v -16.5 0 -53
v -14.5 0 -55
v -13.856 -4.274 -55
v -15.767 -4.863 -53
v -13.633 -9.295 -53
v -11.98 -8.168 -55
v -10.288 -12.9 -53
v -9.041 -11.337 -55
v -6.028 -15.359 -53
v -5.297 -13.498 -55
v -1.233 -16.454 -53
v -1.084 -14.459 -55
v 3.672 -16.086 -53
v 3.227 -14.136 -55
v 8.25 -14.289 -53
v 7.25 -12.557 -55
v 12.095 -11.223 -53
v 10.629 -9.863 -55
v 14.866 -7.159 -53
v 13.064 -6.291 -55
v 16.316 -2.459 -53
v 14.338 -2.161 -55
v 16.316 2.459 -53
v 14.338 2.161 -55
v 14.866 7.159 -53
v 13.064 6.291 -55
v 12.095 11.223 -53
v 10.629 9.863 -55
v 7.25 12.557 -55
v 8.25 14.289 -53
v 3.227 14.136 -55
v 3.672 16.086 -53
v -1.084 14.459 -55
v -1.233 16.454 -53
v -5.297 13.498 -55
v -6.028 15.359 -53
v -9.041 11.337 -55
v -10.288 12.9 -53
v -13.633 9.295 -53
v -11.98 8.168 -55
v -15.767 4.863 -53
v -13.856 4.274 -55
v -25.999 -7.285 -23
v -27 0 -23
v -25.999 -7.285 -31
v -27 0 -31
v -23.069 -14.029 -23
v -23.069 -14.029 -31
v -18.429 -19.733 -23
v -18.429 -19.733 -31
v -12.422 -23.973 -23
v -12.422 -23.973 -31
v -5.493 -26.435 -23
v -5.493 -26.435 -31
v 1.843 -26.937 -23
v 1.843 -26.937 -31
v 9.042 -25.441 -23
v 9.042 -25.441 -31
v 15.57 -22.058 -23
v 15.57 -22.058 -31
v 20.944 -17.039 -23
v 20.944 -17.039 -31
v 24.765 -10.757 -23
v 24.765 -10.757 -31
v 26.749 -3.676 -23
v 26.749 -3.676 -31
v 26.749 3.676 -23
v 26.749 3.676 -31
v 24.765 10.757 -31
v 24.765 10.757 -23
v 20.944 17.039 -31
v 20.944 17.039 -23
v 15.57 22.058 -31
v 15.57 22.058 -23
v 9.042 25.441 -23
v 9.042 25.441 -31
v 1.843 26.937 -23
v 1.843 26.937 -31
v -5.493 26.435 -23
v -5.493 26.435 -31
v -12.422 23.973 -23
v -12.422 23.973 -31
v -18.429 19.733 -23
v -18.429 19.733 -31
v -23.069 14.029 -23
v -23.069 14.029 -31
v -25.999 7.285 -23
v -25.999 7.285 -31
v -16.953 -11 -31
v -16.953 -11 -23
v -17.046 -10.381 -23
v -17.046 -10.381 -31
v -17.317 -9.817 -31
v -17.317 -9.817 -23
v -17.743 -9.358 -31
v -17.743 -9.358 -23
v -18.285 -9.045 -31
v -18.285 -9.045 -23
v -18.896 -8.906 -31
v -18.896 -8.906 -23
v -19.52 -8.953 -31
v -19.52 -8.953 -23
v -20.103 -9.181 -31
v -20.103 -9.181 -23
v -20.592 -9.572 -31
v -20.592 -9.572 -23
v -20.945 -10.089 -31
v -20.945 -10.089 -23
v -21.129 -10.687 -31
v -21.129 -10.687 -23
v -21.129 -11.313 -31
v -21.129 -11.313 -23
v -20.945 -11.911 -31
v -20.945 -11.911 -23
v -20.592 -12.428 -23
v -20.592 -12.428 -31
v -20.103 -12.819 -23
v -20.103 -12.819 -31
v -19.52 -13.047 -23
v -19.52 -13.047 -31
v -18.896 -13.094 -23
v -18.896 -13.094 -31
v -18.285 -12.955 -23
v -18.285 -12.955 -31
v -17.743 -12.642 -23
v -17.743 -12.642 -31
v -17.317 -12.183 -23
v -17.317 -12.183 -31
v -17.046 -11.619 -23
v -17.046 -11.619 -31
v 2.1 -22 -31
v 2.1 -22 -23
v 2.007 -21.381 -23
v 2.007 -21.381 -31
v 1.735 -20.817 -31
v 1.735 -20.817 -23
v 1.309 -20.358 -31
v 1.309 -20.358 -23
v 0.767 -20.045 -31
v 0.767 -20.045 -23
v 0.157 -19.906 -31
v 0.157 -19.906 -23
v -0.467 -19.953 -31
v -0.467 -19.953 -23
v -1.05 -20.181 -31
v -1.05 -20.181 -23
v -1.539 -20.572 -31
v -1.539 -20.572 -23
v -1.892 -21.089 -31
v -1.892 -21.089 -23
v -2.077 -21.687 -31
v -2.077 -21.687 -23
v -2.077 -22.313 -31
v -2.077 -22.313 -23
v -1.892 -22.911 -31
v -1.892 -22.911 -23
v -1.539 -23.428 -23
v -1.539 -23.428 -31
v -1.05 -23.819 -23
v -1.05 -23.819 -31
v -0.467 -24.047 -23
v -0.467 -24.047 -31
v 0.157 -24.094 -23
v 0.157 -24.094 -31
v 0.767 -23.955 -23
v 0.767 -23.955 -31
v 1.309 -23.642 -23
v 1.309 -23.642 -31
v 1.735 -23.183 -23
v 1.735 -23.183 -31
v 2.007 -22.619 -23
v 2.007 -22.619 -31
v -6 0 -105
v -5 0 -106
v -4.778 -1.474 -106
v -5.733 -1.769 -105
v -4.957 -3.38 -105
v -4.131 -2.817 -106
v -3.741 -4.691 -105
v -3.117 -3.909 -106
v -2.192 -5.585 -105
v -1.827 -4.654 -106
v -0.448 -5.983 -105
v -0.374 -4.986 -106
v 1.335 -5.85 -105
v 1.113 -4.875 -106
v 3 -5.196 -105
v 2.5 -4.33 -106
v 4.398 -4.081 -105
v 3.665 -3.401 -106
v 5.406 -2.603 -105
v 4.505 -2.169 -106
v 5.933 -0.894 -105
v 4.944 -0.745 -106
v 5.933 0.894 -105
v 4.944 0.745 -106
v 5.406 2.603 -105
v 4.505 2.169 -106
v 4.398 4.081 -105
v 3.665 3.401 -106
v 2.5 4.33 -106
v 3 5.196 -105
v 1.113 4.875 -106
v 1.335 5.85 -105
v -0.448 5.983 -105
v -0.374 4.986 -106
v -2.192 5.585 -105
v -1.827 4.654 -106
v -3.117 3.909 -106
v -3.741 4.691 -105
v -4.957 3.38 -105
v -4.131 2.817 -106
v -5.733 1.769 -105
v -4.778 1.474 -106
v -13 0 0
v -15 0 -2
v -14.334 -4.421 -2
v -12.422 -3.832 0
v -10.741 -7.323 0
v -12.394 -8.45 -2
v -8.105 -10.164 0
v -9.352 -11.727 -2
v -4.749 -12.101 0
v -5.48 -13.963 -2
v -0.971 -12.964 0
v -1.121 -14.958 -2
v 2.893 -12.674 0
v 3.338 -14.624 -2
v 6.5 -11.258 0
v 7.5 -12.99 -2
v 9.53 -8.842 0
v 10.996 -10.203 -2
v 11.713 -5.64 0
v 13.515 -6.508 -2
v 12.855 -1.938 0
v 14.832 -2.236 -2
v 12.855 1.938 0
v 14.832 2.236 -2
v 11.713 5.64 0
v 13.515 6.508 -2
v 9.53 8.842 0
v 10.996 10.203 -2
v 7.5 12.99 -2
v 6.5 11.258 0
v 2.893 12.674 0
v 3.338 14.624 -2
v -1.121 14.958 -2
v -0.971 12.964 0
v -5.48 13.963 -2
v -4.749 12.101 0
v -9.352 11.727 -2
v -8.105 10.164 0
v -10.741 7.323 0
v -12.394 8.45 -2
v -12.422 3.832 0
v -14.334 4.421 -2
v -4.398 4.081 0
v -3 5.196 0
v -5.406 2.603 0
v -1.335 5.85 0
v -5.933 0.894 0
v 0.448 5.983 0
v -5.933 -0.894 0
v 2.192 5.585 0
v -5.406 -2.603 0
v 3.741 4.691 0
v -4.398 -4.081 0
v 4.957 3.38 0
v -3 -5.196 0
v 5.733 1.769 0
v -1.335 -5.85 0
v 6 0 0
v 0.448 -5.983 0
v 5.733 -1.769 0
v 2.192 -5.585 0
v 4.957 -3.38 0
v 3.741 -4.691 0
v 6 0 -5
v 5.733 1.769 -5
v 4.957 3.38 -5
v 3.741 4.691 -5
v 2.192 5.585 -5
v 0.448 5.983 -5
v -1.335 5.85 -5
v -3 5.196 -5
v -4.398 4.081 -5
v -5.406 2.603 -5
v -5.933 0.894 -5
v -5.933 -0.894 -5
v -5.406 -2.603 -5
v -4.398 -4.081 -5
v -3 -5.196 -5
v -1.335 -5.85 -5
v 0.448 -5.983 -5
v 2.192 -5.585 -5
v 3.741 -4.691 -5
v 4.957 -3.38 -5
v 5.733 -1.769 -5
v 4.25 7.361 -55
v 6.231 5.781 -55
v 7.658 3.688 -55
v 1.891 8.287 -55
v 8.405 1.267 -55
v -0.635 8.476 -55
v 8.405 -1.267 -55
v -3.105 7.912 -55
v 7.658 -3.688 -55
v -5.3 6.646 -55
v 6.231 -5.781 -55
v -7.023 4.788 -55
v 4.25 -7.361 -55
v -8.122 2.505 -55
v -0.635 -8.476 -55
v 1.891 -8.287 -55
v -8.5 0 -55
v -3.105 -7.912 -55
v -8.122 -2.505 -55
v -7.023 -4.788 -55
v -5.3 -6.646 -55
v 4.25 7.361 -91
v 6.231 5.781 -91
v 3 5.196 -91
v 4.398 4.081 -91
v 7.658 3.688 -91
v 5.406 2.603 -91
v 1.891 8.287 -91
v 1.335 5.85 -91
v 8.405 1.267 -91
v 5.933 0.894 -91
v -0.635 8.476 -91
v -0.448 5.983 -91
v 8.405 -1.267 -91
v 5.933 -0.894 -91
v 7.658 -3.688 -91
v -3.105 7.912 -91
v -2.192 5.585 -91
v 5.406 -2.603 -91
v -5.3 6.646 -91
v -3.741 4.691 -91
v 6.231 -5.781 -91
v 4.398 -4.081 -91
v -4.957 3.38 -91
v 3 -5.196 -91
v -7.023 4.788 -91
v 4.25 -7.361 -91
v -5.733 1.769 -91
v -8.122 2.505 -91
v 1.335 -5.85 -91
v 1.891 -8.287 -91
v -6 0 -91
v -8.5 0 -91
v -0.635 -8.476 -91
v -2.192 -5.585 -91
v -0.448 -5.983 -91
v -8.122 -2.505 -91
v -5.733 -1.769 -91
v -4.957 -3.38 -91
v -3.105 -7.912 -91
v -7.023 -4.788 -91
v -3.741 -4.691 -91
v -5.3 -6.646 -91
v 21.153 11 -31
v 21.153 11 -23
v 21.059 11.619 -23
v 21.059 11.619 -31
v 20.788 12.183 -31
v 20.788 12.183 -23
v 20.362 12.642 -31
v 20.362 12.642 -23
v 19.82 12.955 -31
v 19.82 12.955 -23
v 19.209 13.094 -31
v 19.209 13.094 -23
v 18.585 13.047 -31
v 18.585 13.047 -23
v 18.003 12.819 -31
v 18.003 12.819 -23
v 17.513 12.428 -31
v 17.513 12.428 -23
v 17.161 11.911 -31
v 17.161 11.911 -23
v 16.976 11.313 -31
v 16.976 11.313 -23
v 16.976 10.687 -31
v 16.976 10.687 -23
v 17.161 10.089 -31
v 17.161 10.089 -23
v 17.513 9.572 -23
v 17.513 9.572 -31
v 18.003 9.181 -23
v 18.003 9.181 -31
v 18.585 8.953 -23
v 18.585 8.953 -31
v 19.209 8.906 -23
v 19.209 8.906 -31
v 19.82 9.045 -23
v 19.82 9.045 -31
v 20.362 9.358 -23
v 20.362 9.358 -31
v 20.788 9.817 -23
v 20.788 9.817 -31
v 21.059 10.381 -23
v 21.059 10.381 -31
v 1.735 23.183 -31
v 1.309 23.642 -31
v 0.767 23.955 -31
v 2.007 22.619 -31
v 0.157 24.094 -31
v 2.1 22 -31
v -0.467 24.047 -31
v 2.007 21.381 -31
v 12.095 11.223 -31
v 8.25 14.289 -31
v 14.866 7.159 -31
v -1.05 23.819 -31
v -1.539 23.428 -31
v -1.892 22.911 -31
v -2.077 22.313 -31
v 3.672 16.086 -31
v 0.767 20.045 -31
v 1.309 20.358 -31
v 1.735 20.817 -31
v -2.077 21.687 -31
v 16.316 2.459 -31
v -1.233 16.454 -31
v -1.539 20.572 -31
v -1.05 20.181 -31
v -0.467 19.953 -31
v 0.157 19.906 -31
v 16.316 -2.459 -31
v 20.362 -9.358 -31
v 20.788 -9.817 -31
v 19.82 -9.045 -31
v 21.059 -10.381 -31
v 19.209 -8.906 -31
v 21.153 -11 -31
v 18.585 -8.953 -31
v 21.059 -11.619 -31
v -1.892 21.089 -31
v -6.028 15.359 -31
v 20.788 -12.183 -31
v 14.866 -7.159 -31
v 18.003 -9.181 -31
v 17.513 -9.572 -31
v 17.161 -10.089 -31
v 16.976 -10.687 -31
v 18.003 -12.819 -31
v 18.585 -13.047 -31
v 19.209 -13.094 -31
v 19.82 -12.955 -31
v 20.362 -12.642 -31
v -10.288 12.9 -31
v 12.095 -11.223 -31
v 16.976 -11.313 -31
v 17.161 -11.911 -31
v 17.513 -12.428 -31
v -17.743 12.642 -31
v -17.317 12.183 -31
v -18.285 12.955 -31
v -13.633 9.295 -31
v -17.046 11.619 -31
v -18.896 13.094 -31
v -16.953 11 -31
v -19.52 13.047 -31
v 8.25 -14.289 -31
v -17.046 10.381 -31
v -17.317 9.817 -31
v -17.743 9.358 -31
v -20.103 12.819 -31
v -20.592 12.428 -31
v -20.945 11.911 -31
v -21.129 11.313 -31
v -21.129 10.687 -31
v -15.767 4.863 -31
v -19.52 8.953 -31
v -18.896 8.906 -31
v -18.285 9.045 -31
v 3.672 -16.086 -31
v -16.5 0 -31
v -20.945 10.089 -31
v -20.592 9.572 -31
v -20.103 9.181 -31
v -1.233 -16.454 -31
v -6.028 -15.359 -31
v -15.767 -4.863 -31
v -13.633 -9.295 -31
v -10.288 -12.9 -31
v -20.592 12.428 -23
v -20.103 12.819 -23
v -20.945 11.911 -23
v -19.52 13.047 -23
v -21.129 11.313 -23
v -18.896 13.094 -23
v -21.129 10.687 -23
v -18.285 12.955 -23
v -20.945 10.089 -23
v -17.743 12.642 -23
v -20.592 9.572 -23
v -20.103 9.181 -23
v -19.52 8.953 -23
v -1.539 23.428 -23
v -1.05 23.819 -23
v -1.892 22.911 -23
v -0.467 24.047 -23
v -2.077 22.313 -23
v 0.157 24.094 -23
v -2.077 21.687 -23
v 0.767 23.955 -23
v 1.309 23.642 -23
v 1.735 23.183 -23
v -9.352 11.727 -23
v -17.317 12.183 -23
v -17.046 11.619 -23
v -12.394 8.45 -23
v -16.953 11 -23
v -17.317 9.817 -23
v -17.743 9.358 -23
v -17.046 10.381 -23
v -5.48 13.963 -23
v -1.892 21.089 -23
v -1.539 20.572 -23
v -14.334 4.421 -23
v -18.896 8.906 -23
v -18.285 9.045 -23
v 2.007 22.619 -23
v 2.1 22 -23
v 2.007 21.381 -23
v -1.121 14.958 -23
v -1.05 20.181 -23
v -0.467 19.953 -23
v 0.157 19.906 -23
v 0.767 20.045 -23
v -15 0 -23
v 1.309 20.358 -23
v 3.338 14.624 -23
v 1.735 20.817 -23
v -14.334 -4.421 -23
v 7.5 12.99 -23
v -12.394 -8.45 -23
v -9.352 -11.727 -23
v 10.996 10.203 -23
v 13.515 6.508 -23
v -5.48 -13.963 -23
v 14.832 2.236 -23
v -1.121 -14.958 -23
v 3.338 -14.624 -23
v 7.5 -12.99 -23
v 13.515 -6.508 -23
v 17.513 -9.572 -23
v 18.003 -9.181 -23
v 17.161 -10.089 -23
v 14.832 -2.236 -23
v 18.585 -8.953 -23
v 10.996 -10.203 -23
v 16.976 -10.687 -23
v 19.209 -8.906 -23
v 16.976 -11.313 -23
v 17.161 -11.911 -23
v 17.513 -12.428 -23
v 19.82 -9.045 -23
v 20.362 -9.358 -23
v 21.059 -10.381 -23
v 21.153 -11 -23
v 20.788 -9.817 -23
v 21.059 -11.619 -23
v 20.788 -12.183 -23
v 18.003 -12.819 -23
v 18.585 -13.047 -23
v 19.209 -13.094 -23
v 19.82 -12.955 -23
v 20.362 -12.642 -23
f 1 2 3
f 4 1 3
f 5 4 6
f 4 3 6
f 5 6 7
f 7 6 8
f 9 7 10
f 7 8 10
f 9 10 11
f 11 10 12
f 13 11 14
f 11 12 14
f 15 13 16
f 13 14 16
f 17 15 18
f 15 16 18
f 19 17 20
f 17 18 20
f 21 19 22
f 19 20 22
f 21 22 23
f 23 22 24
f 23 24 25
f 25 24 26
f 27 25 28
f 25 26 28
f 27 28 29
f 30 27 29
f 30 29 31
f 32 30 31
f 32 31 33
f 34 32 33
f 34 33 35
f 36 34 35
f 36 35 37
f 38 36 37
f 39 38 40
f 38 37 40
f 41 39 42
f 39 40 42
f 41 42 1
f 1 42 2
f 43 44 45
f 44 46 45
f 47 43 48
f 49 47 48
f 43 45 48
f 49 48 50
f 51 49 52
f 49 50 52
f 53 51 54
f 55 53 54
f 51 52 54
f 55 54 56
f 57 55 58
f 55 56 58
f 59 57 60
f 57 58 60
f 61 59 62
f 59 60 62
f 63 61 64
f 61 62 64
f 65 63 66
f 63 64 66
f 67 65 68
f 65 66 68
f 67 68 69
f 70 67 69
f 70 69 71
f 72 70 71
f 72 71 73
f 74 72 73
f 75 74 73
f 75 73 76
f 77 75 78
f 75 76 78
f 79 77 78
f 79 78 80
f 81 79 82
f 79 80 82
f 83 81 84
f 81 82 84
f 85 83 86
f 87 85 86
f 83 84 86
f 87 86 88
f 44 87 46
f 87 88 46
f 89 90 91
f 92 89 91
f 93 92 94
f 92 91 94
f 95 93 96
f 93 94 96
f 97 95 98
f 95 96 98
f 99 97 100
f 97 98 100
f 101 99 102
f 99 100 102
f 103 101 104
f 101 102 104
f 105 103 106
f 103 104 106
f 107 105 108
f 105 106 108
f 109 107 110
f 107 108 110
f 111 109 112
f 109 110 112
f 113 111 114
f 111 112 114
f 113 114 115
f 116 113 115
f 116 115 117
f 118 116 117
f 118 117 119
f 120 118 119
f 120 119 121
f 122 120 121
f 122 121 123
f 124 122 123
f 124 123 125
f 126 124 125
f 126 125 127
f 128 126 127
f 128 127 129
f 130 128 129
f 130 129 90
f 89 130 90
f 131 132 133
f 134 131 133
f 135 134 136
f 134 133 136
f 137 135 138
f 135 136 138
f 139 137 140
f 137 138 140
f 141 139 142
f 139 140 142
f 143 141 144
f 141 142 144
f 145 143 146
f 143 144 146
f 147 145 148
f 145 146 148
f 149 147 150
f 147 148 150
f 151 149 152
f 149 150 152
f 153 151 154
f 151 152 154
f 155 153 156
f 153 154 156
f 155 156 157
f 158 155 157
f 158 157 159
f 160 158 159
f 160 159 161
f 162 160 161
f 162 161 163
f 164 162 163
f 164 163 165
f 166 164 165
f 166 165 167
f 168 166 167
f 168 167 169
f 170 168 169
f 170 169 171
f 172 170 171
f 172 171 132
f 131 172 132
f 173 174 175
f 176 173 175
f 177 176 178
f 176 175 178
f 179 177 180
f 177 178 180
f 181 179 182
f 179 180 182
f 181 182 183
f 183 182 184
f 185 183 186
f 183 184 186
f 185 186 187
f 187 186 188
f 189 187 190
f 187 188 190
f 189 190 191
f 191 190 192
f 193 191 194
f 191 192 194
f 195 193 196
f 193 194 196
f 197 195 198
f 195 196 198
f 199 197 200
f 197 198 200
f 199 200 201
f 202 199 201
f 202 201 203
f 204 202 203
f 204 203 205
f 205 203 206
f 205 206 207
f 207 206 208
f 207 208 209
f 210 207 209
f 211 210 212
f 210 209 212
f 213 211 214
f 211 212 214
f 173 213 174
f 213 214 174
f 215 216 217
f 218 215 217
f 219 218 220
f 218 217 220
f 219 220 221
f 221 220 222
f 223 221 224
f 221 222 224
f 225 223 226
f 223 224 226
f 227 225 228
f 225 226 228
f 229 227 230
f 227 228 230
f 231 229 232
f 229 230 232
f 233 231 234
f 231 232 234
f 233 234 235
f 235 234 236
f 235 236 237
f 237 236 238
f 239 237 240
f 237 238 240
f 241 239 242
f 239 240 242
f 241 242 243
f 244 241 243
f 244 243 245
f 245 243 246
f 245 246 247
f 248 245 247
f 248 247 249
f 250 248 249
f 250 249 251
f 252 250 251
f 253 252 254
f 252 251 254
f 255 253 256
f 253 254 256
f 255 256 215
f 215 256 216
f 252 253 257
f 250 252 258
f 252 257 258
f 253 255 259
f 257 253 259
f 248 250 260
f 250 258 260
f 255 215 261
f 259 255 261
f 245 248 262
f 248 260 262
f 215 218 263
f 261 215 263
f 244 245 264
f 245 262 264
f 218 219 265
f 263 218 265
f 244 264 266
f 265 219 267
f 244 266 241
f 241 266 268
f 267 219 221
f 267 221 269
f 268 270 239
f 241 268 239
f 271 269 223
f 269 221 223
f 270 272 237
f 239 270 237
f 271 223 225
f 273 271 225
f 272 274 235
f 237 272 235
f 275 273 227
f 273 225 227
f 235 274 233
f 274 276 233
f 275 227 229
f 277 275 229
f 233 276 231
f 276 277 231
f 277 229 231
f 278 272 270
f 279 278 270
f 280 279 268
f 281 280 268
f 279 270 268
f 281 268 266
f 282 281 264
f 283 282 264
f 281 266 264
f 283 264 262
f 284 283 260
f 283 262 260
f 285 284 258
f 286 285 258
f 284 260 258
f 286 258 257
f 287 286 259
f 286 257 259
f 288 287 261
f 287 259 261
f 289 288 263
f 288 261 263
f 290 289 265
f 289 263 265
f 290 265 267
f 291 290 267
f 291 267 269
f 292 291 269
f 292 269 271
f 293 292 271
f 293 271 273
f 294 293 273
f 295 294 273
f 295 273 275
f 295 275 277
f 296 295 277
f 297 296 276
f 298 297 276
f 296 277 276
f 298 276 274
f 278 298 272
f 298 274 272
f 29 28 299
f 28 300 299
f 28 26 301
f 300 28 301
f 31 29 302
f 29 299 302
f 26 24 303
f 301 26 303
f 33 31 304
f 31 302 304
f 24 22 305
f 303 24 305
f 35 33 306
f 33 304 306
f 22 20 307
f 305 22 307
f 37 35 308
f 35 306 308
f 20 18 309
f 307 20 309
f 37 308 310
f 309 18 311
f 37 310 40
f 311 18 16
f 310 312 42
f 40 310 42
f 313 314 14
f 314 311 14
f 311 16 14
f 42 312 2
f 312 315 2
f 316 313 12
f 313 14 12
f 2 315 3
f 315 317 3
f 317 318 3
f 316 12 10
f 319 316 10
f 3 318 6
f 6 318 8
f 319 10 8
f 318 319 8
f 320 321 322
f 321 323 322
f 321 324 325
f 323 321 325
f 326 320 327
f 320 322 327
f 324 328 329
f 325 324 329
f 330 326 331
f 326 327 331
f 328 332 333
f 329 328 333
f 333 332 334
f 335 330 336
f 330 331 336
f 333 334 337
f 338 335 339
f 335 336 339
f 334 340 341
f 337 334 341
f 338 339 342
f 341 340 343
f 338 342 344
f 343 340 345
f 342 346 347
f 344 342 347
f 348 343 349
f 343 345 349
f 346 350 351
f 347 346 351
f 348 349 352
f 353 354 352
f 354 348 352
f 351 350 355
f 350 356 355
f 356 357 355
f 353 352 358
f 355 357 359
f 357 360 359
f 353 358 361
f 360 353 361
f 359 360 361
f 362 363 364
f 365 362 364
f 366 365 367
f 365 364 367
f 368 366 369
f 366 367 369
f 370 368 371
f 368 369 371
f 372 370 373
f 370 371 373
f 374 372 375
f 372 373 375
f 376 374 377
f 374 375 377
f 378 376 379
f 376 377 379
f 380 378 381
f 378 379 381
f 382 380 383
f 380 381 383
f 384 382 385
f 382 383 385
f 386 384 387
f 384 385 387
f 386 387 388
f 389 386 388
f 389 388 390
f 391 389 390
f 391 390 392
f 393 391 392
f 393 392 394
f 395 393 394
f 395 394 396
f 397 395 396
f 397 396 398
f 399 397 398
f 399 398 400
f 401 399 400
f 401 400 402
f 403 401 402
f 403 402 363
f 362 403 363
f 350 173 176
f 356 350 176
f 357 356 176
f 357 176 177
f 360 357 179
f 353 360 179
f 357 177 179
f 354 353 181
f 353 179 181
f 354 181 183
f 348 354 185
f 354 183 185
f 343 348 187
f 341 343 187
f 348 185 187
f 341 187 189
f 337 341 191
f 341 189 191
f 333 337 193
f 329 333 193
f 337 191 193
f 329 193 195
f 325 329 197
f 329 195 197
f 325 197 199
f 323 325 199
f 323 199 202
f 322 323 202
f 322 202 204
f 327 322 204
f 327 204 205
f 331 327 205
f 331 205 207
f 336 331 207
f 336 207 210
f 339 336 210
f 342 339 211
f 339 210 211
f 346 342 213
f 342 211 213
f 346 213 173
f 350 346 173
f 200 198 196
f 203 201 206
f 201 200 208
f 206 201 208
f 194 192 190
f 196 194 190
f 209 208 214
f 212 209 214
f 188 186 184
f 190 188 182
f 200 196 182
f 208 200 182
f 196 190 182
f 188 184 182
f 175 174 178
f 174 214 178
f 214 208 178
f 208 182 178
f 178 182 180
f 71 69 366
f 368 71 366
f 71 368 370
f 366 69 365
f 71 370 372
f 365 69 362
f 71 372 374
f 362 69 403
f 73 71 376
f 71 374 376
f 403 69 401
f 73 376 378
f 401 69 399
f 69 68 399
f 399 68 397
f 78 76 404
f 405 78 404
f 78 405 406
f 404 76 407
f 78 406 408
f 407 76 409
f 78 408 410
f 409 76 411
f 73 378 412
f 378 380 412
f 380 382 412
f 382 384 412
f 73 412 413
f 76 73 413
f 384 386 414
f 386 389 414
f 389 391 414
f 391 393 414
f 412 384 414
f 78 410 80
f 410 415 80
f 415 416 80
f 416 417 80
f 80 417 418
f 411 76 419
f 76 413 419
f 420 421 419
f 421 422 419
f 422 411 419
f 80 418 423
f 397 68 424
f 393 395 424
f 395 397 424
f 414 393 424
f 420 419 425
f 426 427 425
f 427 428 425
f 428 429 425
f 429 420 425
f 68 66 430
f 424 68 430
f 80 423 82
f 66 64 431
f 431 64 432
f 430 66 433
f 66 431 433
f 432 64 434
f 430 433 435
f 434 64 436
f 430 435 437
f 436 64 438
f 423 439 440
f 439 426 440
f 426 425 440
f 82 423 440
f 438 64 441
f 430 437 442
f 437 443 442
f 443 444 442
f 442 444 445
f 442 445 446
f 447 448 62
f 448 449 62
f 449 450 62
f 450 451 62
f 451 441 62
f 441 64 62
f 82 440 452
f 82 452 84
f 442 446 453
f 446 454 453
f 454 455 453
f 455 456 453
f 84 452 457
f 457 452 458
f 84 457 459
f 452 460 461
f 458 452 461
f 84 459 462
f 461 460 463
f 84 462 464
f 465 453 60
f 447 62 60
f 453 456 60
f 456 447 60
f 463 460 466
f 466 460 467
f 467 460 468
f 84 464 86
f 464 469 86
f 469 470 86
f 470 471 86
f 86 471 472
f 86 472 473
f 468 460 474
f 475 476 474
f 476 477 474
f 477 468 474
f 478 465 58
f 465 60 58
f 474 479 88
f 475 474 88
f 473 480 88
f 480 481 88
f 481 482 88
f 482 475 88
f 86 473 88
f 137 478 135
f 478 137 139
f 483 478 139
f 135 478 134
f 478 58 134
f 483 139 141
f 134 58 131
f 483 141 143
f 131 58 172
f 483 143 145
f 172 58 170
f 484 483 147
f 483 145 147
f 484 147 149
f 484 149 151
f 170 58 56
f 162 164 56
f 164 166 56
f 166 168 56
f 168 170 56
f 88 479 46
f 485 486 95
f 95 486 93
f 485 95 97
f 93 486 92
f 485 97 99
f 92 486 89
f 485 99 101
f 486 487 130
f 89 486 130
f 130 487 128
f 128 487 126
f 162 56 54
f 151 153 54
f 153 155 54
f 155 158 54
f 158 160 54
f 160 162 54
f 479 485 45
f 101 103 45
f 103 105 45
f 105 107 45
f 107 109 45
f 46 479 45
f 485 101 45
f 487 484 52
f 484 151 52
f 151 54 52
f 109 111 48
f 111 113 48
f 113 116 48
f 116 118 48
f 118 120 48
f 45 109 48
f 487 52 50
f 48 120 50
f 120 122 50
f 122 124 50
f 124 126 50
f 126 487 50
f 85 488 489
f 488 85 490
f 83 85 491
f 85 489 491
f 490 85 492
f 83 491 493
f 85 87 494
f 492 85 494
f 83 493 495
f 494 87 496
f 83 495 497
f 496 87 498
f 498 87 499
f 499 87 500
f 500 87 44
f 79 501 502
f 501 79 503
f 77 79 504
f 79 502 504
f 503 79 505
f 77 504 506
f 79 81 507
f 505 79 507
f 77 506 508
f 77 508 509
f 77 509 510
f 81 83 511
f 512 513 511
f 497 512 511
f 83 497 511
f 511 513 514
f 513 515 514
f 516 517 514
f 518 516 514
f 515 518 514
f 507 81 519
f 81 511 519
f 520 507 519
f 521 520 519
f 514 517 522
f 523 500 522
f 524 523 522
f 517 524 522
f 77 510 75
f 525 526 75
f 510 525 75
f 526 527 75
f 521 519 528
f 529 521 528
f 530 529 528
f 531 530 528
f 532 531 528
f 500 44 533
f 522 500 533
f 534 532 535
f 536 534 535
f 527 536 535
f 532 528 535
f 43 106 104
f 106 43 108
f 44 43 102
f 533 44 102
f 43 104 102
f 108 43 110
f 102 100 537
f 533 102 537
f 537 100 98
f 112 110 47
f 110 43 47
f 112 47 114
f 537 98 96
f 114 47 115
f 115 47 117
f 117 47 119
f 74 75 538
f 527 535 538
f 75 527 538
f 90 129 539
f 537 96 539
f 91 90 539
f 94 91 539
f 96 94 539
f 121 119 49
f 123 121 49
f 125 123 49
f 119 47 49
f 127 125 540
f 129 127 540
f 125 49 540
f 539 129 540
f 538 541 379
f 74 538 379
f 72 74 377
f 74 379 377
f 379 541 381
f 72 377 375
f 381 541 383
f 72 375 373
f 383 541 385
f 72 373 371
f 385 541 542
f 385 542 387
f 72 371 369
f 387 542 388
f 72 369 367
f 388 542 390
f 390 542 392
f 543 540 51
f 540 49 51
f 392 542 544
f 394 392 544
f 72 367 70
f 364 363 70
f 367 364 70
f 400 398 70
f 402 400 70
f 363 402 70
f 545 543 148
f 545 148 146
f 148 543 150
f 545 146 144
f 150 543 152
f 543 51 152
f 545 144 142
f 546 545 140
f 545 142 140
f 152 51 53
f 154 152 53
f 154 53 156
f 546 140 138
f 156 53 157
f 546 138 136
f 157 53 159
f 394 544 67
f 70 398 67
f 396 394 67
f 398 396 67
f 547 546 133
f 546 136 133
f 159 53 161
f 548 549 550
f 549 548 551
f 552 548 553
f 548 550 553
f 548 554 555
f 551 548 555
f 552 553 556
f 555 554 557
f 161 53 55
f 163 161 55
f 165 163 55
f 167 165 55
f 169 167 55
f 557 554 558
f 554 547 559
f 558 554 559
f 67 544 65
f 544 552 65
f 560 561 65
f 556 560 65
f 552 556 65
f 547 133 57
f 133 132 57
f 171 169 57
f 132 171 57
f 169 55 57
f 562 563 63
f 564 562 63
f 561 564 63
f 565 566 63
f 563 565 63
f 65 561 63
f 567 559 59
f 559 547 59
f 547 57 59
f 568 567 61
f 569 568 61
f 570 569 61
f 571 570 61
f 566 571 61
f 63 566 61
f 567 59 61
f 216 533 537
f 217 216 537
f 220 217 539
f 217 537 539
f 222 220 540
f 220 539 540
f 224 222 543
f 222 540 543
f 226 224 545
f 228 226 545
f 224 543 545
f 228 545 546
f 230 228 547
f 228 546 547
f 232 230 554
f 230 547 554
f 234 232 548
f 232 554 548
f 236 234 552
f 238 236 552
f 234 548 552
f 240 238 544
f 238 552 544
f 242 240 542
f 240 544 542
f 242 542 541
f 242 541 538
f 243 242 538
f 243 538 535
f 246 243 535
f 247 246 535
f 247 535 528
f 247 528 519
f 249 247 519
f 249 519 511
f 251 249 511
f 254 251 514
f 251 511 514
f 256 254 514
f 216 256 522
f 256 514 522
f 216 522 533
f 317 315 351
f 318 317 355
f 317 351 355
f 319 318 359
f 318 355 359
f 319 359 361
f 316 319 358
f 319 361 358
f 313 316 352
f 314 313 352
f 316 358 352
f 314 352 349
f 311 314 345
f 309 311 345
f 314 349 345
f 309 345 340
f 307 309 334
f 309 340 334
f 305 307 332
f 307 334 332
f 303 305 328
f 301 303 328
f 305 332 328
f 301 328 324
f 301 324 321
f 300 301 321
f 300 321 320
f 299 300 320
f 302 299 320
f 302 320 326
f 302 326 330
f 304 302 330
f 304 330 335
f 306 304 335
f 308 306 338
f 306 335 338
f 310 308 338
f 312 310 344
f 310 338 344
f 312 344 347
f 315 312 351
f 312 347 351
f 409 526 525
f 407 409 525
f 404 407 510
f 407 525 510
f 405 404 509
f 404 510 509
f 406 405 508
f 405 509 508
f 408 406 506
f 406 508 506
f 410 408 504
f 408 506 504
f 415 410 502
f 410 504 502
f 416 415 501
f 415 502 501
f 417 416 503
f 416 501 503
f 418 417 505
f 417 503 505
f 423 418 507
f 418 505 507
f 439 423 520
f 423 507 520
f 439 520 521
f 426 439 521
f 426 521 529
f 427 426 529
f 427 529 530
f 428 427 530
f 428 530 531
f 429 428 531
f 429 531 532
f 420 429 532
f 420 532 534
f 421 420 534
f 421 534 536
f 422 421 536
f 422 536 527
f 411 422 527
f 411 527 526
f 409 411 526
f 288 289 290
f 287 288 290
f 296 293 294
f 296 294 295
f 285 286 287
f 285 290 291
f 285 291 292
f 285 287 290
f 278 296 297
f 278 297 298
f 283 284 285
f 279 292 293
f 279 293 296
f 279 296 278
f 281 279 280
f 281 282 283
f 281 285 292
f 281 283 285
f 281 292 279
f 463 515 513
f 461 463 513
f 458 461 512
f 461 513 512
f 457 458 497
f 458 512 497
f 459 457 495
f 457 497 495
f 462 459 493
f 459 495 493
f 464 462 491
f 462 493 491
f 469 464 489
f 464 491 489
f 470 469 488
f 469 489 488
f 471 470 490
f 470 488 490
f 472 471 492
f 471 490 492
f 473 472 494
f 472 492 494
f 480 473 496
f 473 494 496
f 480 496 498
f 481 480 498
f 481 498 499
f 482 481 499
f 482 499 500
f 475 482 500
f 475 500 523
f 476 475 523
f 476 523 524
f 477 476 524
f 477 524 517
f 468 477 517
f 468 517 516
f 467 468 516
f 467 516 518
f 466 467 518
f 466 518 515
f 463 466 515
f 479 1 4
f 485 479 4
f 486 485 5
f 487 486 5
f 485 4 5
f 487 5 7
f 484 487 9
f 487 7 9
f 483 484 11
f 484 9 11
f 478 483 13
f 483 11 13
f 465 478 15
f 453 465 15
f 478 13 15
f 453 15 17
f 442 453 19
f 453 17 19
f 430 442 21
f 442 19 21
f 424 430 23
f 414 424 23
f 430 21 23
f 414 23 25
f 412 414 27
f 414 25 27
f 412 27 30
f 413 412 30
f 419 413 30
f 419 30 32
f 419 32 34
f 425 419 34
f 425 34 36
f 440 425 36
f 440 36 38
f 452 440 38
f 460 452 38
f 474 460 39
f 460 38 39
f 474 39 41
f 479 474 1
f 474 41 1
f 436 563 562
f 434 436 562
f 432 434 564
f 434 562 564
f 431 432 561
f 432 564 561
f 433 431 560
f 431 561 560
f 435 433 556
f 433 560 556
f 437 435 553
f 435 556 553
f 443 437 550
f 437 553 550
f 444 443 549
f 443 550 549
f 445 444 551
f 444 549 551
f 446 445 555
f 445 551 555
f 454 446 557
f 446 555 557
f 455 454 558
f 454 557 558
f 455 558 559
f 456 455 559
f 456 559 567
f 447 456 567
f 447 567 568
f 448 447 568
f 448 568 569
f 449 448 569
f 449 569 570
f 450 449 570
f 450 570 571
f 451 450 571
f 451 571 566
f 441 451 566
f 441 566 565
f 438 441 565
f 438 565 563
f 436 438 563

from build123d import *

# Parameters (mm, degrees)
F2_SIZE  = 2
F3_SIZE  = 1
F4_R     = 6
F5_DEPTH = 5
F6_R     = 2.1
F7_DEPTH = 10


with BuildPart() as f1:
    # F0 (on Front) → F1 (revolve)
    with BuildSketch(Plane.XZ):
        Polygon((0, -106), (0, 0), (-15, 0), (-15, -23), (-27, -23), (-27, -31), (-16.5, -31), (-16.5, -55), (-8.5, -55), (-8.5, -91), (-6, -91), (-6, -106), align=None)
    revolve(axis=Axis((0, 0, -53), (0, 0, 1)))

    # F2
    f2_edges = [f1.edges().sort_by_distance(p)[0] for p in [
        (15, 0, 0),
        (16.5, 0, -55),
    ]]
    chamfer(f2_edges, length=F2_SIZE)

    # F3
    f3_edges = [f1.edges().sort_by_distance(p)[0] for p in [
        (6, 0, -106),
    ]]
    chamfer(f3_edges, length=F3_SIZE)

    # F4 (on face) → F5 (cut)
    with BuildSketch(Plane.XY):
        Circle(F4_R)
    extrude(amount=-F5_DEPTH, mode=Mode.SUBTRACT)

    # F6 (on face) → F7 (cut)
    with BuildSketch(Plane.XY.offset(-23)):
        with Locations((0, 22)):
            Circle(F6_R)
        with Locations((-19.0525588833, 11)):
            Circle(F6_R)
        with Locations((-19.0525588833, -11)):
            Circle(F6_R)
        with Locations((0, -22)):
            Circle(F6_R)
        with Locations((19.0525588833, -11)):
            Circle(F6_R)
        with Locations((19.0525588833, 11)):
            Circle(F6_R)
    extrude(amount=-F7_DEPTH, mode=Mode.SUBTRACT)


solid = f1.part
